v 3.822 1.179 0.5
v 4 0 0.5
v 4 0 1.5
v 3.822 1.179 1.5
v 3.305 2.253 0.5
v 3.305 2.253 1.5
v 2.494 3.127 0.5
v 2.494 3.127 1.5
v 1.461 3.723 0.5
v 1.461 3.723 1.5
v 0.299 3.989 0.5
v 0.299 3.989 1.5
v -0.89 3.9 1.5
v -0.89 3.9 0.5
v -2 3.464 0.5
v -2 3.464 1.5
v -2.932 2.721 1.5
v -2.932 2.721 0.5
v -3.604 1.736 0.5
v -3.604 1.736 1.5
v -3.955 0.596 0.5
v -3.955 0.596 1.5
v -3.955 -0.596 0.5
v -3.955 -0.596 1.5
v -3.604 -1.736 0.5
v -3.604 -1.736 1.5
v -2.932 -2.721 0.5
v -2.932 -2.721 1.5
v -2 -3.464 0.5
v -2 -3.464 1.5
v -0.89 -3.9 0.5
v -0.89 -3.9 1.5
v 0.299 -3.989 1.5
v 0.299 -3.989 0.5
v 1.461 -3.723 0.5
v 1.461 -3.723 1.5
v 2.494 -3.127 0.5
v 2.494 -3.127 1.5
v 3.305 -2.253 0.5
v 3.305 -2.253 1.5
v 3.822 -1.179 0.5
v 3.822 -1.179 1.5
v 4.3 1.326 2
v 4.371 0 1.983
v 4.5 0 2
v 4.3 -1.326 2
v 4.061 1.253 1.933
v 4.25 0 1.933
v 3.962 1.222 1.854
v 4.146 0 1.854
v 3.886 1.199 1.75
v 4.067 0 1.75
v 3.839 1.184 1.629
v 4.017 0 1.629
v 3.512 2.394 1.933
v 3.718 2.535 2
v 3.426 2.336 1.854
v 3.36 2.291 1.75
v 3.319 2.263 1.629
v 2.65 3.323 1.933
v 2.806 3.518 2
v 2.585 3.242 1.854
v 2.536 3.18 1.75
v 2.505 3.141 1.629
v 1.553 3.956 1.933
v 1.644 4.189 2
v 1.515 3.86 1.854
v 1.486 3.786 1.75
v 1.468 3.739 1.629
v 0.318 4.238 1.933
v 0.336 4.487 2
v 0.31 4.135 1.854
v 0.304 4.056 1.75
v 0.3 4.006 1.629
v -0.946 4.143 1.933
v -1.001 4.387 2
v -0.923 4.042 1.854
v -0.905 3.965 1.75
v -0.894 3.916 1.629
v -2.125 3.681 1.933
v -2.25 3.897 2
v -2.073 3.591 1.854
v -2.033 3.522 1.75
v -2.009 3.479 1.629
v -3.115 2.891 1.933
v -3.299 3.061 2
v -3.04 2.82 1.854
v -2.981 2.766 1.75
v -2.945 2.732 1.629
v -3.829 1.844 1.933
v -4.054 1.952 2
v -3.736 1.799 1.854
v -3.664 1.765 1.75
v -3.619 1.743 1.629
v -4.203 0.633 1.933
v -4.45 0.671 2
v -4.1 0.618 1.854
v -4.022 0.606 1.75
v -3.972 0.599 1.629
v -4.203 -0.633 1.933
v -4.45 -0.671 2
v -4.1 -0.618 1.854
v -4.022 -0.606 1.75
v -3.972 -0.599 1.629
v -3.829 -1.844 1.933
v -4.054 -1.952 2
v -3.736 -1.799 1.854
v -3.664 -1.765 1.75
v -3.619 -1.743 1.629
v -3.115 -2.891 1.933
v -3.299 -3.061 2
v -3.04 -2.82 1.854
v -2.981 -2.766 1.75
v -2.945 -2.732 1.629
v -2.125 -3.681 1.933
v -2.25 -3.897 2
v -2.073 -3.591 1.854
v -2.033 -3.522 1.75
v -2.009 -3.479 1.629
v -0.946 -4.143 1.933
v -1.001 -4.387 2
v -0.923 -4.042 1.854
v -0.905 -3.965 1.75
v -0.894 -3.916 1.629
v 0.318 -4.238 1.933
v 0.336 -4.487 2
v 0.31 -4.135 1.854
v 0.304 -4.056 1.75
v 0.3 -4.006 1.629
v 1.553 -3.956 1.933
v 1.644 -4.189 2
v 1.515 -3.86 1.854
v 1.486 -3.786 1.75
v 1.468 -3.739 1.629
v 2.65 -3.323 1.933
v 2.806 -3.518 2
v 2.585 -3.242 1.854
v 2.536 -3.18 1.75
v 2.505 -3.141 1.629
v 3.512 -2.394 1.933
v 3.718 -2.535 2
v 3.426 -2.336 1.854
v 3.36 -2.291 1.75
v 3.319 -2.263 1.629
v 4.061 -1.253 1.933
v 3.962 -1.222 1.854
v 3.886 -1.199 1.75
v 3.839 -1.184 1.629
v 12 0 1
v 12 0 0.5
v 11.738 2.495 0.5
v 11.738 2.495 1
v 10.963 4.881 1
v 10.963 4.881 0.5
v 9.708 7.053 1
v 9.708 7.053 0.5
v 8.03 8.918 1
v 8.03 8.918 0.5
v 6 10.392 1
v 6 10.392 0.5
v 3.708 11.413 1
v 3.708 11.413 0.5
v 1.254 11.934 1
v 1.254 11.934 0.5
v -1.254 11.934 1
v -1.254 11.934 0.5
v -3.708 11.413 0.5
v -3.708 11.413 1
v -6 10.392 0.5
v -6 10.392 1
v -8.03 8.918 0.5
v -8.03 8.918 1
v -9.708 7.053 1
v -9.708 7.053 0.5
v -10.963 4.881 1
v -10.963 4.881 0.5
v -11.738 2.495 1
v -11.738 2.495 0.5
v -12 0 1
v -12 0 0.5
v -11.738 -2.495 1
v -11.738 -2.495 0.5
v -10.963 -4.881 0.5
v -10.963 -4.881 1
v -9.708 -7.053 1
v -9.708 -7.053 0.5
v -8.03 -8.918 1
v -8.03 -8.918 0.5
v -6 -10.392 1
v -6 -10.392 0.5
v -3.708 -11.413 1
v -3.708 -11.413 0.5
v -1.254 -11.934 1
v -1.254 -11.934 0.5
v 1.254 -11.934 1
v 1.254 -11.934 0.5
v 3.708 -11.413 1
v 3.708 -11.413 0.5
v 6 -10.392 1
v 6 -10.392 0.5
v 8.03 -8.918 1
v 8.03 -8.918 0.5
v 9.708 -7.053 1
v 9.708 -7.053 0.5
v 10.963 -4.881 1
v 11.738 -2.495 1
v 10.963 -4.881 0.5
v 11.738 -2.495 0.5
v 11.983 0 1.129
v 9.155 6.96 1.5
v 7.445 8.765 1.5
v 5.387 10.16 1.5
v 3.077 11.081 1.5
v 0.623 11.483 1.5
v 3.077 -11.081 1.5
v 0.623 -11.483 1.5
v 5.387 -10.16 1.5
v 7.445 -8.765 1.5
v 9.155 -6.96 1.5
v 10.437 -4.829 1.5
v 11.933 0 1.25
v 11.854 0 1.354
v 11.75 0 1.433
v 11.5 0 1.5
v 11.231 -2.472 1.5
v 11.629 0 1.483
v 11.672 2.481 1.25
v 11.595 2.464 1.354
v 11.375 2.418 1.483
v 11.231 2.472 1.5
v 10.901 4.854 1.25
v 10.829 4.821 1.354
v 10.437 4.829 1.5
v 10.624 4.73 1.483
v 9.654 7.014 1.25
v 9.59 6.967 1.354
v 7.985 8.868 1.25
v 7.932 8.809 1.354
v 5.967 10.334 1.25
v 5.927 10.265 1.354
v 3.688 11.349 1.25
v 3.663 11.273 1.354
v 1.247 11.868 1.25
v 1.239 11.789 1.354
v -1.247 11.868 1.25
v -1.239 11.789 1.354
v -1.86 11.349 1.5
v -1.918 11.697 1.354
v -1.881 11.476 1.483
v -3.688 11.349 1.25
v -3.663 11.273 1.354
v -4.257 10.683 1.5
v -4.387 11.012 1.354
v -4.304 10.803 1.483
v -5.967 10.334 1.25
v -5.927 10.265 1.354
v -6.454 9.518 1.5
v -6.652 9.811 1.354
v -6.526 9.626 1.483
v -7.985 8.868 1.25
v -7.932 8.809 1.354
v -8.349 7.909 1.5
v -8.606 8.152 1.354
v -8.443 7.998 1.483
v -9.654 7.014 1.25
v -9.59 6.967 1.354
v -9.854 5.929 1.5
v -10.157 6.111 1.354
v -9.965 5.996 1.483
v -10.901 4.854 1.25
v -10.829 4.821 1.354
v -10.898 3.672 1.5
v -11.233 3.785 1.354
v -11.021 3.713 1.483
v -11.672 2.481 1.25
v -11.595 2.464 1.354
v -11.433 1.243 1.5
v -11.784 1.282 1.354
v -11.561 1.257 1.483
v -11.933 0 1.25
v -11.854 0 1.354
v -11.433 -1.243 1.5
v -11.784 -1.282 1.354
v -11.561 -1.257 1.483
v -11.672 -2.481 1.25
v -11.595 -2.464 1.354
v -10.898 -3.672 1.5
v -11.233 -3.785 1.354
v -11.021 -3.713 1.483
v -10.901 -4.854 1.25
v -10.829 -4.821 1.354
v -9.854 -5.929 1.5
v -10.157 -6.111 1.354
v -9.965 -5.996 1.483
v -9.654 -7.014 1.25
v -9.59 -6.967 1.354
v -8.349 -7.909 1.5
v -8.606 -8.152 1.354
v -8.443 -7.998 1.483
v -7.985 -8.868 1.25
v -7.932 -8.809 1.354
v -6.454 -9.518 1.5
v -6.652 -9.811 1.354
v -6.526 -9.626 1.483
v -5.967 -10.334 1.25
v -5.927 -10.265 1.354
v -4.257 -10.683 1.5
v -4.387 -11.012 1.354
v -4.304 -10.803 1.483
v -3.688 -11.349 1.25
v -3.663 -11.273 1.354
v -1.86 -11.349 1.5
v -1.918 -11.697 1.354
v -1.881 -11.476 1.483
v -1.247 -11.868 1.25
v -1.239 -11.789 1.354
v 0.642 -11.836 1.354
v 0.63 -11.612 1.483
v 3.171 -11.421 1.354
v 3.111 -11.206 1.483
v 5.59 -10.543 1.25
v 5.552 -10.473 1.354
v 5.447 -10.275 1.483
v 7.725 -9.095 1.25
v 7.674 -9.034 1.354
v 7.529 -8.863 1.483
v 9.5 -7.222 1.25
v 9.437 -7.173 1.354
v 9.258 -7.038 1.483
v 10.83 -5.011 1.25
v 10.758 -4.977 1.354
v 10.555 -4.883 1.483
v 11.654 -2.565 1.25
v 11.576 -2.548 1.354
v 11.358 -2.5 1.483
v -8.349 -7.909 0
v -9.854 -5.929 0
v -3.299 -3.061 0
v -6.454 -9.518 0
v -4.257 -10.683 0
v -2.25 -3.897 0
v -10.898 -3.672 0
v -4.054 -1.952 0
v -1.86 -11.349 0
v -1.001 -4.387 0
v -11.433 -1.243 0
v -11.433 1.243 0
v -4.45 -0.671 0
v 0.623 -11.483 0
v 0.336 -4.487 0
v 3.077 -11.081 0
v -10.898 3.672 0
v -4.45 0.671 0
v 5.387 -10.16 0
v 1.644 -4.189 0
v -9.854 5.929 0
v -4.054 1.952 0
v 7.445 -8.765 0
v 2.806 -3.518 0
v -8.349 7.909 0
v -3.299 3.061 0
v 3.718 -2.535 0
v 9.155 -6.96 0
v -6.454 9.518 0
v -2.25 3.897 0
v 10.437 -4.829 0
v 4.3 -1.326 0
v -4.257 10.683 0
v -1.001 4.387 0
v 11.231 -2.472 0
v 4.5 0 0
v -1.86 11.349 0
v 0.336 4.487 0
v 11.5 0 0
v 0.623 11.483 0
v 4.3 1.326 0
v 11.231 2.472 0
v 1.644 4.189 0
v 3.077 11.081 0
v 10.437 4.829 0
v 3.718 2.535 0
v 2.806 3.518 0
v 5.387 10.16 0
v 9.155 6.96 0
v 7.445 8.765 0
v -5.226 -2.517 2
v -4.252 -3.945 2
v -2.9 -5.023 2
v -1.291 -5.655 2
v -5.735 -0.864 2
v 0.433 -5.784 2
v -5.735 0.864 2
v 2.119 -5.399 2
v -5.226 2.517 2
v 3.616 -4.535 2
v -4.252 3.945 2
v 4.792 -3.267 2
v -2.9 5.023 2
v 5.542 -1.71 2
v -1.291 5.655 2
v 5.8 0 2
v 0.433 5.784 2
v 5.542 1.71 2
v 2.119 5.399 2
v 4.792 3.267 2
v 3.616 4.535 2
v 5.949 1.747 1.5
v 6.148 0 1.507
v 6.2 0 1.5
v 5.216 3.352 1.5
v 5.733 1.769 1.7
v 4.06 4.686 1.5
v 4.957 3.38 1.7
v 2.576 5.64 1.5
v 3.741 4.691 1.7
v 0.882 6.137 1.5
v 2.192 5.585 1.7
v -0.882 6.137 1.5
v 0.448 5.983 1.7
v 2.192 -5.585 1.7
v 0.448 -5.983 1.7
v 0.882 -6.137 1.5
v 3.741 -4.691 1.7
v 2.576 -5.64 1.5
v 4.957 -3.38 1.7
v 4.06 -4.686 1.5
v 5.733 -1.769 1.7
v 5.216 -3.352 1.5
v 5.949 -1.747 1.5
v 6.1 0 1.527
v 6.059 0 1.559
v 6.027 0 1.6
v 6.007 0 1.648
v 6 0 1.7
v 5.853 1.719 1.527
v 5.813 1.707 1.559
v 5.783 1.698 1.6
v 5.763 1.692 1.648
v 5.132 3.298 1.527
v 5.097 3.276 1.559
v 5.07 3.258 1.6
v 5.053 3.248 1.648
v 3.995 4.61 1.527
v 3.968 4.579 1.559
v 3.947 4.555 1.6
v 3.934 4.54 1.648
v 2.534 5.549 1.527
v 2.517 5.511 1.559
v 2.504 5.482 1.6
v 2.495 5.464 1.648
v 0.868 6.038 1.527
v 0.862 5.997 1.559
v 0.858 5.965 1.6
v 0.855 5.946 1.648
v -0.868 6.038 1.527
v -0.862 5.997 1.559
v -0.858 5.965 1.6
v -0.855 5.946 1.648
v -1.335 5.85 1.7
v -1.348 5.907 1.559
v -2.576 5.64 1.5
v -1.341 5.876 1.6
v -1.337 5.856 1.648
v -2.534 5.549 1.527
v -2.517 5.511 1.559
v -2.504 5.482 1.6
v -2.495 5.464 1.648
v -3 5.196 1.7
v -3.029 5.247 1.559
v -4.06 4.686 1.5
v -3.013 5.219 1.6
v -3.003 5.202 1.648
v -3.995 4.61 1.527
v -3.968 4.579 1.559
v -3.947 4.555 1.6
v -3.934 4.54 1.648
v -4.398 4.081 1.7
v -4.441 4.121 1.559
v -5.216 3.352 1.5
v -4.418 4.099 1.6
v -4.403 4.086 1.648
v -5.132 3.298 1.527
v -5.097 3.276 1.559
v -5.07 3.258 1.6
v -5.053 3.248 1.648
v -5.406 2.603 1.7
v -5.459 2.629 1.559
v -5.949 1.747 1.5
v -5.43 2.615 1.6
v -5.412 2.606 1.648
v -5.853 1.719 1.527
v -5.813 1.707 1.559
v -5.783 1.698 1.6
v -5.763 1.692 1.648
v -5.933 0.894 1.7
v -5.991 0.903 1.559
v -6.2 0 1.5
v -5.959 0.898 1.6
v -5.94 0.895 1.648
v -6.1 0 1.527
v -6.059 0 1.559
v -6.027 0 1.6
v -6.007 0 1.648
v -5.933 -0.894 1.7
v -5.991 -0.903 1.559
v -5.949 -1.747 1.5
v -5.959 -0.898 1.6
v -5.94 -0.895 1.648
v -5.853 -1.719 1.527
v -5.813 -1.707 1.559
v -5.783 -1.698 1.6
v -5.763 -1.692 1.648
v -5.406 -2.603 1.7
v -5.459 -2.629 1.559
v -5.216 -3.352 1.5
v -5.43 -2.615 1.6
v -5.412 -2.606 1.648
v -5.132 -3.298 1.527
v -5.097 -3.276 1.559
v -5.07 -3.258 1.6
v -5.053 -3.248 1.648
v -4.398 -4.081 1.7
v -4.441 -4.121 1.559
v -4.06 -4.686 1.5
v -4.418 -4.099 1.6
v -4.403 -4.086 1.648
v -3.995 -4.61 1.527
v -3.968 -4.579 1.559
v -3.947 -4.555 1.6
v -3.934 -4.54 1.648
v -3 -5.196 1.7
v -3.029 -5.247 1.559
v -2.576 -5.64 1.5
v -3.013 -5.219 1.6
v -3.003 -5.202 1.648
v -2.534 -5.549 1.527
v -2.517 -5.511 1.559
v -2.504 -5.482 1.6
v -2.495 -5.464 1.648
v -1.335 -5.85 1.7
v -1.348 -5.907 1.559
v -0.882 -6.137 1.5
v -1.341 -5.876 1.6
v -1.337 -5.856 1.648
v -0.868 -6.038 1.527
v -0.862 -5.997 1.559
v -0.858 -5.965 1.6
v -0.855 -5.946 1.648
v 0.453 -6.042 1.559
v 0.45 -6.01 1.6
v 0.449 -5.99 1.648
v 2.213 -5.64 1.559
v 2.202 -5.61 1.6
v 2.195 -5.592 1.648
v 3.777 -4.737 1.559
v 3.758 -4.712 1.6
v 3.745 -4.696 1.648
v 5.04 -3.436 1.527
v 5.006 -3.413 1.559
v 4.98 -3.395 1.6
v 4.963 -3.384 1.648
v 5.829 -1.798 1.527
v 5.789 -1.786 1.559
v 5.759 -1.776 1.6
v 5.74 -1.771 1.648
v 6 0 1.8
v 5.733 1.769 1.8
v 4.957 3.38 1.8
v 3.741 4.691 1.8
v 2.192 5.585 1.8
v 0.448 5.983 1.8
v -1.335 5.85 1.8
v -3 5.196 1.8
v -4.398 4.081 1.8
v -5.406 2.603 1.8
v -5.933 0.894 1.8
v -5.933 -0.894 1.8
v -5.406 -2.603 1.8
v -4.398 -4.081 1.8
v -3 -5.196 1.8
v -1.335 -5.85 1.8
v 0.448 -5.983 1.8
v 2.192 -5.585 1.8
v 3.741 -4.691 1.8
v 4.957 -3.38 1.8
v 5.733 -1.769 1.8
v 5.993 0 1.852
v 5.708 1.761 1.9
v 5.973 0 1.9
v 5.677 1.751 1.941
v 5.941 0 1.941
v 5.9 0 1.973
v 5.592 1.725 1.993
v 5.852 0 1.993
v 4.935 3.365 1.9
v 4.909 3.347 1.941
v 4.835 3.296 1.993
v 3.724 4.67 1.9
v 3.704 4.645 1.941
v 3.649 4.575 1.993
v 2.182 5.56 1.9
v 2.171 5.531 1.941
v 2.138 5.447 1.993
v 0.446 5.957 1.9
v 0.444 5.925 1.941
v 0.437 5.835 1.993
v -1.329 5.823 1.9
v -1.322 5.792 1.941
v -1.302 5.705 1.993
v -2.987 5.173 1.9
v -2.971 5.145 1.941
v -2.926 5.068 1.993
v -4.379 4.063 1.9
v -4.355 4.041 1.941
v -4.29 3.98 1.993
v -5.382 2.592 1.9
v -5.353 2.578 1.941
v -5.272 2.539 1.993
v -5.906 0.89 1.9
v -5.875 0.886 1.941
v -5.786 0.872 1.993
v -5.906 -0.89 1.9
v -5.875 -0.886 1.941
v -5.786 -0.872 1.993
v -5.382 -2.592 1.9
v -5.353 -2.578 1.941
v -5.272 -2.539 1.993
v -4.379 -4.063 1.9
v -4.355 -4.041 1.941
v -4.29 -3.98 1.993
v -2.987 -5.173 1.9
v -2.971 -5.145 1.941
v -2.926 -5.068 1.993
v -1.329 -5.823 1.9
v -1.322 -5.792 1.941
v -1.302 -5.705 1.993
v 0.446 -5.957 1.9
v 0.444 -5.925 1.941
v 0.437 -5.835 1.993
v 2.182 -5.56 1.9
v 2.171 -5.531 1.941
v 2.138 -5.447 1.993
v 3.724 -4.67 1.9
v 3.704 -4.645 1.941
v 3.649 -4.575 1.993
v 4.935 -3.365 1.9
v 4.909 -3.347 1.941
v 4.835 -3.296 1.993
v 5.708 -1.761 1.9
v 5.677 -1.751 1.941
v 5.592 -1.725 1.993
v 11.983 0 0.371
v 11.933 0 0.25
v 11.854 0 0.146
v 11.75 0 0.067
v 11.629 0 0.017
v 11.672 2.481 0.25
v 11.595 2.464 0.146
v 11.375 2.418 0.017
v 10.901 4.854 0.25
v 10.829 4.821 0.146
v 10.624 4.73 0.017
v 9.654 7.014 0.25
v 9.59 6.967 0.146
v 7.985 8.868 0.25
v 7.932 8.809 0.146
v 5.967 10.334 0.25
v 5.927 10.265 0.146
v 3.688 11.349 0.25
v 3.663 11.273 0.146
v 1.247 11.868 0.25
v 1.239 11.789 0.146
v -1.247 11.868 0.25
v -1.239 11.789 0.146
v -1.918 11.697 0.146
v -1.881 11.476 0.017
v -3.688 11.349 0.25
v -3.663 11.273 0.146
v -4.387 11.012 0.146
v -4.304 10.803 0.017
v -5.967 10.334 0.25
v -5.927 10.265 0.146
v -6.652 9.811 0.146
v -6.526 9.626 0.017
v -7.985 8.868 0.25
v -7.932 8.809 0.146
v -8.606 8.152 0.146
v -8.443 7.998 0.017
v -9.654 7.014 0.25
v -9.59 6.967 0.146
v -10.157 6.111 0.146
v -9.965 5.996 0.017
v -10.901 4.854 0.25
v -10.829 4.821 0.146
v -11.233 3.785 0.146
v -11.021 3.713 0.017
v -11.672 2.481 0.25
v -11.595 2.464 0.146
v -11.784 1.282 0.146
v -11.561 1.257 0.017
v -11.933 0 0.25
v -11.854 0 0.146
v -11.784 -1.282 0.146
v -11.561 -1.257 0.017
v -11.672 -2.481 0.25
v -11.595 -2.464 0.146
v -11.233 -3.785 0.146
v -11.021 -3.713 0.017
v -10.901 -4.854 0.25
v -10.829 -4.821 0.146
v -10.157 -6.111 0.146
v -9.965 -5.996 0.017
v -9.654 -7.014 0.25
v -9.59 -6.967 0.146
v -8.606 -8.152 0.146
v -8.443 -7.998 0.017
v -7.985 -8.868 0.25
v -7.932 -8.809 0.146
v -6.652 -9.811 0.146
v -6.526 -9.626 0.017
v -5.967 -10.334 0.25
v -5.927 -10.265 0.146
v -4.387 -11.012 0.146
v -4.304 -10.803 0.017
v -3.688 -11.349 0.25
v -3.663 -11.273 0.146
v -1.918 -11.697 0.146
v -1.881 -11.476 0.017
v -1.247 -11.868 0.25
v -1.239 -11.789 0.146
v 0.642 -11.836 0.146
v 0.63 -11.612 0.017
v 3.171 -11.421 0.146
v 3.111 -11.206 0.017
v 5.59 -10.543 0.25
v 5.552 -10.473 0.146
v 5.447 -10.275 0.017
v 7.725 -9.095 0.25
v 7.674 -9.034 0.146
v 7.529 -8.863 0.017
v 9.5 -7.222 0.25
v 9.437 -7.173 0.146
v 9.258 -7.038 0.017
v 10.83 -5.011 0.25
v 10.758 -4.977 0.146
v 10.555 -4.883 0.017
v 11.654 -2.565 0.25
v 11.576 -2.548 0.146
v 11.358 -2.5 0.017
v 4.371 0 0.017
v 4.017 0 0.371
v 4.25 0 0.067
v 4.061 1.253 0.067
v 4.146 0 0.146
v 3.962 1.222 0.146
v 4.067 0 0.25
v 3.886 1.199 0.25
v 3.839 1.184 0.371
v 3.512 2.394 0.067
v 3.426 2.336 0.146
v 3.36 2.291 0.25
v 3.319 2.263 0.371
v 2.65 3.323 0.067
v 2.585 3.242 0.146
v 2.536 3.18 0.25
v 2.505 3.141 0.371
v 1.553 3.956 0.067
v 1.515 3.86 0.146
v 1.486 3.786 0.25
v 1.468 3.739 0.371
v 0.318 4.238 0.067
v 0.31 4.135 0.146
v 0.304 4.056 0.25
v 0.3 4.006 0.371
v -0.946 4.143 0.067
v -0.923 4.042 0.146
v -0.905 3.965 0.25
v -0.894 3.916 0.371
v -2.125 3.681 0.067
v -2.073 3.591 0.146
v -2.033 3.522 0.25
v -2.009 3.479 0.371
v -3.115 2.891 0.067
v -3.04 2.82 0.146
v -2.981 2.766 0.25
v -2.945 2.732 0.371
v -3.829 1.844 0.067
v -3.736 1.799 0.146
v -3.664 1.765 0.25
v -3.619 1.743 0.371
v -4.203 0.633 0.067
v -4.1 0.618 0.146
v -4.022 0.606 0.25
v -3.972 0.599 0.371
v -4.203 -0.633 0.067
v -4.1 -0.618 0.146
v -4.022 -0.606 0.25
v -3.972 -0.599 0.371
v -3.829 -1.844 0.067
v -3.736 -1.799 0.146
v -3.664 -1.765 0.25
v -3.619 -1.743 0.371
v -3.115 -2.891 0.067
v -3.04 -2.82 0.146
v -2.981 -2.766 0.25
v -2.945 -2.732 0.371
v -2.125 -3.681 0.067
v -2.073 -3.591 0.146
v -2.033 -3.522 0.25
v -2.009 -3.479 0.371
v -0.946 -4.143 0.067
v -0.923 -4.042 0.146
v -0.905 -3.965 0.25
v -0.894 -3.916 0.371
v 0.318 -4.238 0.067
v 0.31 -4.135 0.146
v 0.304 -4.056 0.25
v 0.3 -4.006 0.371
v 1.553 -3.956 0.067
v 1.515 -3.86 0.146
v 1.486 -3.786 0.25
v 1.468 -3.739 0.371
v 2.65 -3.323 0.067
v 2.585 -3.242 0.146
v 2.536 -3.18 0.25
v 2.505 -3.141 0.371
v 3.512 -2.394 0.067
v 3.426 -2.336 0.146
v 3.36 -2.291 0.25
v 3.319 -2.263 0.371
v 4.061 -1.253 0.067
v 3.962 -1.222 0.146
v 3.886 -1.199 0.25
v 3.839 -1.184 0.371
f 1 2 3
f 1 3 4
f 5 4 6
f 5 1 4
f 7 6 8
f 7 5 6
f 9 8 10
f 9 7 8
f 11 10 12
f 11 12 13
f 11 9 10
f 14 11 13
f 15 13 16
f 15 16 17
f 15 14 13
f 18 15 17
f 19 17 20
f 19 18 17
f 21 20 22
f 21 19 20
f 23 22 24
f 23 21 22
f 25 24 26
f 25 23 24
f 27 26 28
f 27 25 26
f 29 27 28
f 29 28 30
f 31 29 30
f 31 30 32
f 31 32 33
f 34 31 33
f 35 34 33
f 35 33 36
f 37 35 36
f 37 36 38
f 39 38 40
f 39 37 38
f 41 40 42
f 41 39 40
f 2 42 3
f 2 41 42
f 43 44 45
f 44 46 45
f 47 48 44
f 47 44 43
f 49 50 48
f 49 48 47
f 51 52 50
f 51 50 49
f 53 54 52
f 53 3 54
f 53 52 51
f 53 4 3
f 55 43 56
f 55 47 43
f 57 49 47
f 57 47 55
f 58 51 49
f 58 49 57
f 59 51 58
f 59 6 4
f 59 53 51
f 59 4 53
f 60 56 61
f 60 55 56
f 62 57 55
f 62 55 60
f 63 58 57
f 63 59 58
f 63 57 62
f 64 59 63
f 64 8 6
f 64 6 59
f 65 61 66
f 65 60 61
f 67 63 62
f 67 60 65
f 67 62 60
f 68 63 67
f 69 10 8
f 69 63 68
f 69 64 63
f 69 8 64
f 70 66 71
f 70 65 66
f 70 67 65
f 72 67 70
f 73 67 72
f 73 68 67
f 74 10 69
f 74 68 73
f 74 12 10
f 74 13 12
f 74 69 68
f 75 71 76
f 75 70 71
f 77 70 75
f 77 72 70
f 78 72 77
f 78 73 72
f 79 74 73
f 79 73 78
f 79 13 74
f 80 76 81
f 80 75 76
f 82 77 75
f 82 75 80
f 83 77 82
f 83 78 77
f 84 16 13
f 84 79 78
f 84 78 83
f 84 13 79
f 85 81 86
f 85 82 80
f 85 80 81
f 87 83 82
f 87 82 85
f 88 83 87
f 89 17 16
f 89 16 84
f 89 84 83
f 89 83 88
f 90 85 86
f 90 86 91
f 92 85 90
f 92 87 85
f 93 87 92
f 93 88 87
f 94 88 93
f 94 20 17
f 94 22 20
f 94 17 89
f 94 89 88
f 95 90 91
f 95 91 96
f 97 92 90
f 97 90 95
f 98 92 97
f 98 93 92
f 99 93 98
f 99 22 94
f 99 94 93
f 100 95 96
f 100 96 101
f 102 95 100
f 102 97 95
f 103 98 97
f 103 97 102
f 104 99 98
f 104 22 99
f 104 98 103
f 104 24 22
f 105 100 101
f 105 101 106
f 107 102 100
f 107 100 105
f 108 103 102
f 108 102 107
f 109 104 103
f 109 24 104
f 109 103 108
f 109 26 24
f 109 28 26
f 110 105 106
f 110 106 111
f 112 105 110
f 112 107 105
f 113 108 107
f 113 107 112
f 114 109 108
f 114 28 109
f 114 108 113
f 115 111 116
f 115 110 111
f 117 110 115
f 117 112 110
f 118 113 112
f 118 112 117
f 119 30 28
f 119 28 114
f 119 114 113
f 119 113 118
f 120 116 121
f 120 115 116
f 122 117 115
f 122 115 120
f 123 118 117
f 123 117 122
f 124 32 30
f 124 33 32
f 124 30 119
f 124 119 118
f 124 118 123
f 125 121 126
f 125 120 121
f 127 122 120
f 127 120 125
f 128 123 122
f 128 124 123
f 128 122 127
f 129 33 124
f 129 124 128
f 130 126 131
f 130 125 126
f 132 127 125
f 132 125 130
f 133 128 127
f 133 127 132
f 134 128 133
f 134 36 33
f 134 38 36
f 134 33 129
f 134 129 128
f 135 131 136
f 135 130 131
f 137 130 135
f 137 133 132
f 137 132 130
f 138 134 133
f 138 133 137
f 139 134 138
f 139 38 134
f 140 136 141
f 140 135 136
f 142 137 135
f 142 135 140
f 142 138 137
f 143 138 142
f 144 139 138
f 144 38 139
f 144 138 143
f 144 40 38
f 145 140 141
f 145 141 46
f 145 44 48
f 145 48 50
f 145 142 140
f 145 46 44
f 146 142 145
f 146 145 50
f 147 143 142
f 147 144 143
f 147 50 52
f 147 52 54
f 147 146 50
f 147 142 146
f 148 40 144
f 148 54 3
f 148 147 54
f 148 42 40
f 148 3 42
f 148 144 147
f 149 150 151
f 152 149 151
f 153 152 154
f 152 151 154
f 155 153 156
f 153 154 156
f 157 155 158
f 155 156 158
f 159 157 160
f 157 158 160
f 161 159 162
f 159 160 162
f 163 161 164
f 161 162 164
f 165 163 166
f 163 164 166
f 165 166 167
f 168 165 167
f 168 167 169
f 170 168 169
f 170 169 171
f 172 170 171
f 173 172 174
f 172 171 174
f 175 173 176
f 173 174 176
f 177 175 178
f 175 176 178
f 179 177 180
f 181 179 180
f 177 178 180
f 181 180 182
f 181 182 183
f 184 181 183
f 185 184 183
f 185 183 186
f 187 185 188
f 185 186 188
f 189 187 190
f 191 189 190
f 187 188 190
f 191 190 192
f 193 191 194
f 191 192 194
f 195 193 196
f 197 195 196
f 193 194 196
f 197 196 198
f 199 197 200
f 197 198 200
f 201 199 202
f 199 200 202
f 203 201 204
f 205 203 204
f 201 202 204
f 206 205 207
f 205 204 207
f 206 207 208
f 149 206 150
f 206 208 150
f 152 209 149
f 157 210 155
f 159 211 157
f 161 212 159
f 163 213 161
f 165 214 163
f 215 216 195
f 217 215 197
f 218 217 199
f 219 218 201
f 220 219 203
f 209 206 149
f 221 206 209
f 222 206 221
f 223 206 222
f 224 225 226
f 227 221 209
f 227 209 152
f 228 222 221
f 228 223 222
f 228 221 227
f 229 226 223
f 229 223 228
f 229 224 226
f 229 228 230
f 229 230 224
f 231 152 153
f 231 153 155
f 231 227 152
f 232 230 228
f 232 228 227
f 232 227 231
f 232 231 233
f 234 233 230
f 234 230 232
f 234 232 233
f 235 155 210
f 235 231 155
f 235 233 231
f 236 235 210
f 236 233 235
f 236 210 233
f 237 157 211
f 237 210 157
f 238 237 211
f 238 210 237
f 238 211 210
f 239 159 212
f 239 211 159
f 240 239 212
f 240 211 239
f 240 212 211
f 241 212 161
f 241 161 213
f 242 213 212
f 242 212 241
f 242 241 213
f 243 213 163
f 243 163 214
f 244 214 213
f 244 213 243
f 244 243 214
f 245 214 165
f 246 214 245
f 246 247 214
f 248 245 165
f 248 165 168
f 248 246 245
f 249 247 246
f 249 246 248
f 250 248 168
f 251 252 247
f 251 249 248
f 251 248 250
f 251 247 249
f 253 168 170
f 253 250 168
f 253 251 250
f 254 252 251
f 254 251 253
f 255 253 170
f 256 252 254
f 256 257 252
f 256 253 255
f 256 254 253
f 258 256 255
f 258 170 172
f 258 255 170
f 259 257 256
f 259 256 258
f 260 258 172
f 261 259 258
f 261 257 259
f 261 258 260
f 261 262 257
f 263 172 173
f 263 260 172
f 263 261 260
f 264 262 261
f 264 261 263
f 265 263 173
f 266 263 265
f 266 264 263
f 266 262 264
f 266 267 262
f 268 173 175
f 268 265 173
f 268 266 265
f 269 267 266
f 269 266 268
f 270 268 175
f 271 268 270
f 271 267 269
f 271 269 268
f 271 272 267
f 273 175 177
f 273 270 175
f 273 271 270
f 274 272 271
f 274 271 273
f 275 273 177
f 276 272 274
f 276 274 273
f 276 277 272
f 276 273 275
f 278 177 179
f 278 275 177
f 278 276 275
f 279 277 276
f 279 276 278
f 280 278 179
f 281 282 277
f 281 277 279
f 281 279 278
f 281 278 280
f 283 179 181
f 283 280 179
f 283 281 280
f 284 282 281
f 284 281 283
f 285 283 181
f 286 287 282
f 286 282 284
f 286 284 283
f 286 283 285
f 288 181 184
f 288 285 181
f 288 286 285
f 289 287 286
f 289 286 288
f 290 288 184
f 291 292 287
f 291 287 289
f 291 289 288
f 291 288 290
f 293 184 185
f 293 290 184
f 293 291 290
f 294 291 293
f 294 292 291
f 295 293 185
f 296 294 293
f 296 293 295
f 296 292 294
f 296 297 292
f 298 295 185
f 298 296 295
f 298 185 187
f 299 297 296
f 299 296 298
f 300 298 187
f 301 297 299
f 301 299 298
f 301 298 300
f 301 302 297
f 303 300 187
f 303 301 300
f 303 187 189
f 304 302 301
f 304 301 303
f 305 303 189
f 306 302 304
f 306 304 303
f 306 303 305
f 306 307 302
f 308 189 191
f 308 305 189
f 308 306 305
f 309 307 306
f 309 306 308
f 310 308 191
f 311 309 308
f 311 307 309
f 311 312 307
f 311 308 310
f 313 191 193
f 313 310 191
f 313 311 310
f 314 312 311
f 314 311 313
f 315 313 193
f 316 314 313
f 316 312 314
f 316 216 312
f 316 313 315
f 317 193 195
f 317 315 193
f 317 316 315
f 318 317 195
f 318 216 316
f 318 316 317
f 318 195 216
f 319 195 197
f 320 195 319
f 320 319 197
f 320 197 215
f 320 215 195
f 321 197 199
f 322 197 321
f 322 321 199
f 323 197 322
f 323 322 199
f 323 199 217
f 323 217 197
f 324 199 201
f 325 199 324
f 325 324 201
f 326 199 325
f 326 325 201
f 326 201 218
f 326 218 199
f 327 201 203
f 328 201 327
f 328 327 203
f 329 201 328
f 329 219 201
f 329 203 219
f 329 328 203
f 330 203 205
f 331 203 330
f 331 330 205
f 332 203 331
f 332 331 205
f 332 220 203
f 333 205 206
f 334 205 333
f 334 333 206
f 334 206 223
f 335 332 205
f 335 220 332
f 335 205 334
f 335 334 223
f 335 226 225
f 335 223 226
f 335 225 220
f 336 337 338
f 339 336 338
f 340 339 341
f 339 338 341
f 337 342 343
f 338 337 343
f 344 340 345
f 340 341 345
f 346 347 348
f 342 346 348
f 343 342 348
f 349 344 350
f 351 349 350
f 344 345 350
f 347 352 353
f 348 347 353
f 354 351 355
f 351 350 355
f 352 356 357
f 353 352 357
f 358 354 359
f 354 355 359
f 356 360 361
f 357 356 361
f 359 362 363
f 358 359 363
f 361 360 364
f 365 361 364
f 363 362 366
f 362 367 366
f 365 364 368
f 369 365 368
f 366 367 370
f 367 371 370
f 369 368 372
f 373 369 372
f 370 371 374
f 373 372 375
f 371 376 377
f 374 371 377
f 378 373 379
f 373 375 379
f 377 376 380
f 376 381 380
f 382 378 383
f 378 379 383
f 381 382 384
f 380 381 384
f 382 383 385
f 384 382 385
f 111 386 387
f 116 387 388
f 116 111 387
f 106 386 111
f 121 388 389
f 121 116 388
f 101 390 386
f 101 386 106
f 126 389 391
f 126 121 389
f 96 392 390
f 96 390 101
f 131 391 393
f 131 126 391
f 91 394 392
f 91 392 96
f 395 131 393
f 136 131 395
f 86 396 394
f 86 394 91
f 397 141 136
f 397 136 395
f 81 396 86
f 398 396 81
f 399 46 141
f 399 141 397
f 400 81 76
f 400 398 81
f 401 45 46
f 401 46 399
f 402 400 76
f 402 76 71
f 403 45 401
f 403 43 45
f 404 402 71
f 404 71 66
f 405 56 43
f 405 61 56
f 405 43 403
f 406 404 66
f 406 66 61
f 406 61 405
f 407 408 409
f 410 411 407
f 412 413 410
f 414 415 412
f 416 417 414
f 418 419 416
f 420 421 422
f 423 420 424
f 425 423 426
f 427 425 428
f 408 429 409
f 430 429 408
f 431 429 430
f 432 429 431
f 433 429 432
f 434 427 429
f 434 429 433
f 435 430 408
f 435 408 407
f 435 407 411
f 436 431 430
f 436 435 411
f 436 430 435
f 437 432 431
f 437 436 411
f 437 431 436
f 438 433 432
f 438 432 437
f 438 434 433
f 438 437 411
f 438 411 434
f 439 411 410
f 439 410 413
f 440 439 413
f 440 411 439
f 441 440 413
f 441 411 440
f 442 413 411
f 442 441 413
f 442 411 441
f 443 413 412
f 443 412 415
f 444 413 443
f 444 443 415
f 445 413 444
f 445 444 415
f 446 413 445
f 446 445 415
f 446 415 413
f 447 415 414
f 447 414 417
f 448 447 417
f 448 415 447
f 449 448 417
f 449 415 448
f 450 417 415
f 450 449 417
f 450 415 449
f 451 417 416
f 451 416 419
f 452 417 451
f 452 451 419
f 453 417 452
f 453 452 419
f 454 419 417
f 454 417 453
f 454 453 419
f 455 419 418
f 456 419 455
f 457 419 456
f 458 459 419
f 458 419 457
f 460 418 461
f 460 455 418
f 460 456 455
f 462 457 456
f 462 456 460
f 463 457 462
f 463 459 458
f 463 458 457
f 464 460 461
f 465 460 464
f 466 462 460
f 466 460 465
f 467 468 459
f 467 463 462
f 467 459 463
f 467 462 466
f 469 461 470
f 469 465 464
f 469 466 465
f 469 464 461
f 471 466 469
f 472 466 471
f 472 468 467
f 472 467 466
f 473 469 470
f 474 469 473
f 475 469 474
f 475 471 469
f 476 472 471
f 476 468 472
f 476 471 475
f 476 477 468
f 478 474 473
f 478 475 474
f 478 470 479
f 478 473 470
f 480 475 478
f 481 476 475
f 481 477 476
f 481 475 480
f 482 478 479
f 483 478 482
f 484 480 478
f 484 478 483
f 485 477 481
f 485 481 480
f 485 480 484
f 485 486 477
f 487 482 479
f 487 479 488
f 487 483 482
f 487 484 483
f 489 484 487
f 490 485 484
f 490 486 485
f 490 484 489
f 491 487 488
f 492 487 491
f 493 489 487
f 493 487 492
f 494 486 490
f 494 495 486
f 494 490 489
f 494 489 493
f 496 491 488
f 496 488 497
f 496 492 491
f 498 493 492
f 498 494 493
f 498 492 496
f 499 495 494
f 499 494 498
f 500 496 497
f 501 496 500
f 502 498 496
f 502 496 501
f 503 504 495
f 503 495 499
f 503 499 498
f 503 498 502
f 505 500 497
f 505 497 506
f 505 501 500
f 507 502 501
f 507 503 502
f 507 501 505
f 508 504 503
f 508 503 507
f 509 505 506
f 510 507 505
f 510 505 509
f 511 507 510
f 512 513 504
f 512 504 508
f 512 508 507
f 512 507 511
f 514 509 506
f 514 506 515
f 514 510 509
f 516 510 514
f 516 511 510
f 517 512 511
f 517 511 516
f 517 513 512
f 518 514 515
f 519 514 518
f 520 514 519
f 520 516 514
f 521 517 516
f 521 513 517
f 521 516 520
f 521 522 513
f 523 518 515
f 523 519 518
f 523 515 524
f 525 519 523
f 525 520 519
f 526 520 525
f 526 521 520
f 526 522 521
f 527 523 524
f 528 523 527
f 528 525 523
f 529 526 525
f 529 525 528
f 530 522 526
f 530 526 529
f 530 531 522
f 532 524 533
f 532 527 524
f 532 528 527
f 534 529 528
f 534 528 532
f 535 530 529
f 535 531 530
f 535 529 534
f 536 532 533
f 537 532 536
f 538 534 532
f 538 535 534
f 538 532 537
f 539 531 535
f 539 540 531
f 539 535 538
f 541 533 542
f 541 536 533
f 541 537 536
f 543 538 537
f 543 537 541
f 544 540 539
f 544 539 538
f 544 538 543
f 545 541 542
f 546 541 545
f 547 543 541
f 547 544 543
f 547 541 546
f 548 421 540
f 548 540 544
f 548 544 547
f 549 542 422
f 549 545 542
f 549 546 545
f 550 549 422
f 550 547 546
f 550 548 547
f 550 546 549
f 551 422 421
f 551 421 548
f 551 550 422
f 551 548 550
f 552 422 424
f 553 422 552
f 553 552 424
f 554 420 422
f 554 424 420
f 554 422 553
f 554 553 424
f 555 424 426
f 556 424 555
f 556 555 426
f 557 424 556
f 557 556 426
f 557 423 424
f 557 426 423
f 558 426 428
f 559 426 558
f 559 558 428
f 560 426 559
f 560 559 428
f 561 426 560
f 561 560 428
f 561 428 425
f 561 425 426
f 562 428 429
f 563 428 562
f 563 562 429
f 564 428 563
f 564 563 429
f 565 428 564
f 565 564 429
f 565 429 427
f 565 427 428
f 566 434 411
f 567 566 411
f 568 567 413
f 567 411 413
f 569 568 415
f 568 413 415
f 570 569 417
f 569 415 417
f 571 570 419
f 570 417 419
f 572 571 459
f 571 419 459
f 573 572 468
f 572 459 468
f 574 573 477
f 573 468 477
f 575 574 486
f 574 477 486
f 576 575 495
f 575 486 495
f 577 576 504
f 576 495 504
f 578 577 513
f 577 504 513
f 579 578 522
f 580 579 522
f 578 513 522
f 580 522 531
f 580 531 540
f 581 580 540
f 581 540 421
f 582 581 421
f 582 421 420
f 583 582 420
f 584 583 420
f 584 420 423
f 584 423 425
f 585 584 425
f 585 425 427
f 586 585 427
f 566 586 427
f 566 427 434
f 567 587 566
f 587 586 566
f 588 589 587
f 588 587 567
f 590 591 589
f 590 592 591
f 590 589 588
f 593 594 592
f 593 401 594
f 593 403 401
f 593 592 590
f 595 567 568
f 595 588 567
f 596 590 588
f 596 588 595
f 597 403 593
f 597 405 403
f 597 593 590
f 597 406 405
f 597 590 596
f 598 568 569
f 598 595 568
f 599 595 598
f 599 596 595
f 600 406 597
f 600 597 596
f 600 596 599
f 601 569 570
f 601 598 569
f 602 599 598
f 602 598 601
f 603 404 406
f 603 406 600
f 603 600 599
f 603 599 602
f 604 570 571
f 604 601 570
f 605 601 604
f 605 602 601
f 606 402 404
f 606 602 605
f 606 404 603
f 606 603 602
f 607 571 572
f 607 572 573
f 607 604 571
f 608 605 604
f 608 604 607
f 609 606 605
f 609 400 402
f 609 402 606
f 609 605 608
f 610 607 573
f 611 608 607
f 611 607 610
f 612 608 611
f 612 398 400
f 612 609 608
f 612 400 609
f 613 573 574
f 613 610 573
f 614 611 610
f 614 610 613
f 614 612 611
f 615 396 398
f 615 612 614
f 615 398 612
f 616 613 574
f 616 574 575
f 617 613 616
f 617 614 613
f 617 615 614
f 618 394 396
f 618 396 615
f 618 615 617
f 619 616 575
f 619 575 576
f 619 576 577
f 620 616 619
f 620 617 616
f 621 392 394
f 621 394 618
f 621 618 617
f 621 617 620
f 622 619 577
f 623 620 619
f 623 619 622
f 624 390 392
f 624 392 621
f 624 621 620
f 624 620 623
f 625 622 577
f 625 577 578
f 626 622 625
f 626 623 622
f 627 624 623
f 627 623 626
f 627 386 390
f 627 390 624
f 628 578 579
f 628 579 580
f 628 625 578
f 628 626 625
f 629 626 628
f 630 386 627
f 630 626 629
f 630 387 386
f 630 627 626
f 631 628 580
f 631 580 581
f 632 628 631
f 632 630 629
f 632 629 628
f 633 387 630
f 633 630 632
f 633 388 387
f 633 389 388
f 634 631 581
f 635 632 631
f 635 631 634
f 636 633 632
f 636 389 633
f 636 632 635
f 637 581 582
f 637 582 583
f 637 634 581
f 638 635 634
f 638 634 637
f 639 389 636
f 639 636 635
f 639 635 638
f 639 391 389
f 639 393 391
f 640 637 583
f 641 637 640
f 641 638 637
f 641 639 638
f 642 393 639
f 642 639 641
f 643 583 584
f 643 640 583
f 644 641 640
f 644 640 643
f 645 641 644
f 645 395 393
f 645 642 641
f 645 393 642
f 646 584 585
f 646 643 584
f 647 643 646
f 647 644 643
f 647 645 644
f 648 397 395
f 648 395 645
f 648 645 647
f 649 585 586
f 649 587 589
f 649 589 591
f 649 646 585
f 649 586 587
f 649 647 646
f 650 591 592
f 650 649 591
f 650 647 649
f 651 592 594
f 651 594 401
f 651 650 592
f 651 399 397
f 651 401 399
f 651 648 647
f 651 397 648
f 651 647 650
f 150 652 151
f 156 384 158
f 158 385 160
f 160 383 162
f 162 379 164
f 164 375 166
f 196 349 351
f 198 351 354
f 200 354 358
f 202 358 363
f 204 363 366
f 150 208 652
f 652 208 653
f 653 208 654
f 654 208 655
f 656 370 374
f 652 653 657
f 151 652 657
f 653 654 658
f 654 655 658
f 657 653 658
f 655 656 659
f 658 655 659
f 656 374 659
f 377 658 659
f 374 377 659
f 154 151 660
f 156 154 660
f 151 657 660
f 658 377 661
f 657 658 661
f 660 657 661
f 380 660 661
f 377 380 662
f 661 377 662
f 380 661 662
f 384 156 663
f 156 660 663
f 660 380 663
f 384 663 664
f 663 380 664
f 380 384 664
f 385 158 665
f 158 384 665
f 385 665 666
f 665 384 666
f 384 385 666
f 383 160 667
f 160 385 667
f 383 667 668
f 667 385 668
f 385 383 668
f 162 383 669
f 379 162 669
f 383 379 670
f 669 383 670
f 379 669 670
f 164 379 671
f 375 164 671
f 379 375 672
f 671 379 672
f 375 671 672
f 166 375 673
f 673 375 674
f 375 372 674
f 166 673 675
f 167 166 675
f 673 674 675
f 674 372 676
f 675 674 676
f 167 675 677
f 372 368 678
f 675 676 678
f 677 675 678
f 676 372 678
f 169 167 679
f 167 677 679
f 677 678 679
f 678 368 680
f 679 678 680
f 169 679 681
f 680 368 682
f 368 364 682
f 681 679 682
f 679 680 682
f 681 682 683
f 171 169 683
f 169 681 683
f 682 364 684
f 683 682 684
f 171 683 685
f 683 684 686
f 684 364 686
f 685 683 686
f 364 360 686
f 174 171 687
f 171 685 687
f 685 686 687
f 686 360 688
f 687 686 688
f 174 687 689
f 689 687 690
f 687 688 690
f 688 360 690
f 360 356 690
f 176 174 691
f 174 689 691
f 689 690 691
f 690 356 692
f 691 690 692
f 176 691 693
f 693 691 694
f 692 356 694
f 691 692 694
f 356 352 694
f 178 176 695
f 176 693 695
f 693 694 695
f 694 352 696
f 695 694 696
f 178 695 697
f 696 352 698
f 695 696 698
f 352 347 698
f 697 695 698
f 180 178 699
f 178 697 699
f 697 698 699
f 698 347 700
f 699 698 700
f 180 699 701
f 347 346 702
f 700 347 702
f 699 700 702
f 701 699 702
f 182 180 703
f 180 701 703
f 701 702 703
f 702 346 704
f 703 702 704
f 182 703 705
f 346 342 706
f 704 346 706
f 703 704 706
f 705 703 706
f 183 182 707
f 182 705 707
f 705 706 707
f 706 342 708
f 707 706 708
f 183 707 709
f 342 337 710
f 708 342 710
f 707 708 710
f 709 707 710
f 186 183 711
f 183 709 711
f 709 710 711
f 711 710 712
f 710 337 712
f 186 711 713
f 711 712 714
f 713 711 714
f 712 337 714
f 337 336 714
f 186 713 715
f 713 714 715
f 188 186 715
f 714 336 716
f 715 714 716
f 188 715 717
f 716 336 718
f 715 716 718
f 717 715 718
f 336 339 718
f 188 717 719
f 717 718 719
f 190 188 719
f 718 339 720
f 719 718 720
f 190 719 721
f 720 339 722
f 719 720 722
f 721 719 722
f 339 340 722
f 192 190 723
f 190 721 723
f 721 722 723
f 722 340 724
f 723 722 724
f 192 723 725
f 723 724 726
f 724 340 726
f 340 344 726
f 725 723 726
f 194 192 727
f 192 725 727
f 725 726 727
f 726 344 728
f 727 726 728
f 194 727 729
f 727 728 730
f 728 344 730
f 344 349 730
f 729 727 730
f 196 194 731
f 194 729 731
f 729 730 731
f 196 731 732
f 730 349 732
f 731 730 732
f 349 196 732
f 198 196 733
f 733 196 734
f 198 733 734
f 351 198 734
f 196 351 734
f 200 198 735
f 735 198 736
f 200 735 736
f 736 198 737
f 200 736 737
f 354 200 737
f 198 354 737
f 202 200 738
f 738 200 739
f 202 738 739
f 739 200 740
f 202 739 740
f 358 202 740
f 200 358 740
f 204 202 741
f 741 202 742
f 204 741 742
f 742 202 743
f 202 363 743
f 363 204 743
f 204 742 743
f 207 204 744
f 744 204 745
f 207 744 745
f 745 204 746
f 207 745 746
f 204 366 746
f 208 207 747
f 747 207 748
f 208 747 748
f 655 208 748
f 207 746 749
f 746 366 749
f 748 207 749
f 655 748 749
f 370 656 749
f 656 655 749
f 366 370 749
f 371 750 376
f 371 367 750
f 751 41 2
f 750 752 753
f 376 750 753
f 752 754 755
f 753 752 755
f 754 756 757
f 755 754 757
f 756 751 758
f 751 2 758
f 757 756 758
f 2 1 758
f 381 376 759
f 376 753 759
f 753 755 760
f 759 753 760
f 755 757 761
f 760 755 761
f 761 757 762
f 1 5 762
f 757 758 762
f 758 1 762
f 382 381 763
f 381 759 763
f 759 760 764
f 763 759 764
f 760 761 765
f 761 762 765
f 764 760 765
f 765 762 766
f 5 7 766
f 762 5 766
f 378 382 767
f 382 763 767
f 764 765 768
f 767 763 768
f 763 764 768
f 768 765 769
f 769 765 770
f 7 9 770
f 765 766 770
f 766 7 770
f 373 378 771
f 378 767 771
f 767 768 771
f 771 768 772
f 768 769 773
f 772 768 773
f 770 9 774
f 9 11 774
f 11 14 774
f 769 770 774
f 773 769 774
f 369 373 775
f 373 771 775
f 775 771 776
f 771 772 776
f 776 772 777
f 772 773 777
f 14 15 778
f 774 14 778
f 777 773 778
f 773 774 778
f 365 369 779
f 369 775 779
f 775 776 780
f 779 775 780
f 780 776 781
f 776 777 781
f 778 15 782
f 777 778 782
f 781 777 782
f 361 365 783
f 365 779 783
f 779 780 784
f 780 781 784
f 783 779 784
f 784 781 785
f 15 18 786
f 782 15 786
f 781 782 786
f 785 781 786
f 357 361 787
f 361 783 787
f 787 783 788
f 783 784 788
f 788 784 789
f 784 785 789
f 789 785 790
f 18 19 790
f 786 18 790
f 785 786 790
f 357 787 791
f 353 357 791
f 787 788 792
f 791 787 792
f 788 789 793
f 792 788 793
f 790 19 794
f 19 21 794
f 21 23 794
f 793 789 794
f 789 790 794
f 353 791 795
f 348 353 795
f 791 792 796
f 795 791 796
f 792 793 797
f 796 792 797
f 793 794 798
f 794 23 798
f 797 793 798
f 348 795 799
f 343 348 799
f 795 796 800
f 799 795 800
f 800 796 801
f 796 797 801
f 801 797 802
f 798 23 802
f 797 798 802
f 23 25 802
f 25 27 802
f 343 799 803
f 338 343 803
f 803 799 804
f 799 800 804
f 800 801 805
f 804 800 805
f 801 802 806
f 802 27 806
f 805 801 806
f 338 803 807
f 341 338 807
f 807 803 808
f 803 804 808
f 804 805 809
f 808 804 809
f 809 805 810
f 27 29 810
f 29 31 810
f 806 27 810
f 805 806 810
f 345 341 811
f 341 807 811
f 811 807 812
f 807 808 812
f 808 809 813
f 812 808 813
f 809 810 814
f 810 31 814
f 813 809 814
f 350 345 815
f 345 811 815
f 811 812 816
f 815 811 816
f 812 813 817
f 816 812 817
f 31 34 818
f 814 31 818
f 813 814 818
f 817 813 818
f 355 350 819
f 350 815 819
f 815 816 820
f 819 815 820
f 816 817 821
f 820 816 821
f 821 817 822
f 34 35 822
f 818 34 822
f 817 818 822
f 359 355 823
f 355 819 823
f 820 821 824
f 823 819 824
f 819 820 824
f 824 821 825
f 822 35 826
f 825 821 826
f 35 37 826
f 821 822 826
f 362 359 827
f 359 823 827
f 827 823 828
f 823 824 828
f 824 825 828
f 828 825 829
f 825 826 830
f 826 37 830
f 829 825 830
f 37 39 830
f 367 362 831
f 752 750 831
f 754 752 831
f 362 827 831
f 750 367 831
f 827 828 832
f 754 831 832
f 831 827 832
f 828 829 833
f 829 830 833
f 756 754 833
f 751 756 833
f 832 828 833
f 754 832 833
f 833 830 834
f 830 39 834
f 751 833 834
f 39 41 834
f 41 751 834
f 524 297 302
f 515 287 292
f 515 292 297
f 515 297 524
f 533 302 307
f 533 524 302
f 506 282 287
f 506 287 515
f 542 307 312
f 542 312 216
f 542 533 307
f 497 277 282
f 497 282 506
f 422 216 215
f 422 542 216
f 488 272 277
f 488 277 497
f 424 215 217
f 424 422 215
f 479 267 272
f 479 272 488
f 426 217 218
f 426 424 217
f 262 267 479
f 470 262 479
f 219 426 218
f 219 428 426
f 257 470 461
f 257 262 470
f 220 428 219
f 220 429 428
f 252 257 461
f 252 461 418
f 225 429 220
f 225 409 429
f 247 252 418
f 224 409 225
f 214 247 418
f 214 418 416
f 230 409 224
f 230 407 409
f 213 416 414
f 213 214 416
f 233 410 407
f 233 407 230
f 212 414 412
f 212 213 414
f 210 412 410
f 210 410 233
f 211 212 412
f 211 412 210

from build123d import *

# Parameters (mm, degrees)
F0_R     = 6
F0_R_2   = 4
F1_DEPTH = 2
F0_R_3   = 12
F2_DEPTH = 1.5
F3_R     = 0.5
F4_R     = 0.2
F5_R     = 0.5


with BuildPart() as f1:
    # F0 (on Top) → F1 (new body)
    with BuildSketch(Plane.XY):
        Circle(F0_R)
        Circle(F0_R_2, mode=Mode.SUBTRACT)
    extrude(amount=F1_DEPTH)

    # F0 (on Top) → F2 (join)
    with BuildSketch(Plane.XY):
        Circle(F0_R_3)
        Circle(F0_R, mode=Mode.SUBTRACT)
    extrude(amount=F2_DEPTH)

    # F3
    f3_edges = [f1.edges().sort_by_distance(p)[0] for p in [
        (-12, 0, 1.5),
    ]]
    fillet(f3_edges, radius=F3_R)

    # F4
    f4_edges = [f1.edges().sort_by_distance(p)[0] for p in [
        (-6, 0, 1.5),
        (-6, 0, 2),
    ]]
    fillet(f4_edges, radius=F4_R)

    # F5
    f5_edges = [f1.edges().sort_by_distance(p)[0] for p in [
        (-12, 0, 0),
        (-4, 0, 0),
        (-4, 0, 2),
    ]]
    fillet(f5_edges, radius=F5_R)


solid = f1.part
